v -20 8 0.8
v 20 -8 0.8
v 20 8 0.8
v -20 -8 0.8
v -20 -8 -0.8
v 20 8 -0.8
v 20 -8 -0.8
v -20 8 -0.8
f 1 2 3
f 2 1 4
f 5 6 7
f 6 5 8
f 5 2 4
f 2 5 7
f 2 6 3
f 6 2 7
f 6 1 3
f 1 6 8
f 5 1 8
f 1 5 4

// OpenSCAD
// Parameters
pcb_length = 40.0; //[20.0:80.0:0.5]
pcb_width = 16.0; //[8.0:32.0:0.5]
pcb_thickness = 1.6; //[0.8:3.2:0.1]

// PCB Module
module pcb_body() {
  color([0.0, 0.4, 0.2]) // Green color for PCB
  cube([pcb_length, pcb_width, pcb_thickness], center=true);
}

// Final Model
pcb_body();
